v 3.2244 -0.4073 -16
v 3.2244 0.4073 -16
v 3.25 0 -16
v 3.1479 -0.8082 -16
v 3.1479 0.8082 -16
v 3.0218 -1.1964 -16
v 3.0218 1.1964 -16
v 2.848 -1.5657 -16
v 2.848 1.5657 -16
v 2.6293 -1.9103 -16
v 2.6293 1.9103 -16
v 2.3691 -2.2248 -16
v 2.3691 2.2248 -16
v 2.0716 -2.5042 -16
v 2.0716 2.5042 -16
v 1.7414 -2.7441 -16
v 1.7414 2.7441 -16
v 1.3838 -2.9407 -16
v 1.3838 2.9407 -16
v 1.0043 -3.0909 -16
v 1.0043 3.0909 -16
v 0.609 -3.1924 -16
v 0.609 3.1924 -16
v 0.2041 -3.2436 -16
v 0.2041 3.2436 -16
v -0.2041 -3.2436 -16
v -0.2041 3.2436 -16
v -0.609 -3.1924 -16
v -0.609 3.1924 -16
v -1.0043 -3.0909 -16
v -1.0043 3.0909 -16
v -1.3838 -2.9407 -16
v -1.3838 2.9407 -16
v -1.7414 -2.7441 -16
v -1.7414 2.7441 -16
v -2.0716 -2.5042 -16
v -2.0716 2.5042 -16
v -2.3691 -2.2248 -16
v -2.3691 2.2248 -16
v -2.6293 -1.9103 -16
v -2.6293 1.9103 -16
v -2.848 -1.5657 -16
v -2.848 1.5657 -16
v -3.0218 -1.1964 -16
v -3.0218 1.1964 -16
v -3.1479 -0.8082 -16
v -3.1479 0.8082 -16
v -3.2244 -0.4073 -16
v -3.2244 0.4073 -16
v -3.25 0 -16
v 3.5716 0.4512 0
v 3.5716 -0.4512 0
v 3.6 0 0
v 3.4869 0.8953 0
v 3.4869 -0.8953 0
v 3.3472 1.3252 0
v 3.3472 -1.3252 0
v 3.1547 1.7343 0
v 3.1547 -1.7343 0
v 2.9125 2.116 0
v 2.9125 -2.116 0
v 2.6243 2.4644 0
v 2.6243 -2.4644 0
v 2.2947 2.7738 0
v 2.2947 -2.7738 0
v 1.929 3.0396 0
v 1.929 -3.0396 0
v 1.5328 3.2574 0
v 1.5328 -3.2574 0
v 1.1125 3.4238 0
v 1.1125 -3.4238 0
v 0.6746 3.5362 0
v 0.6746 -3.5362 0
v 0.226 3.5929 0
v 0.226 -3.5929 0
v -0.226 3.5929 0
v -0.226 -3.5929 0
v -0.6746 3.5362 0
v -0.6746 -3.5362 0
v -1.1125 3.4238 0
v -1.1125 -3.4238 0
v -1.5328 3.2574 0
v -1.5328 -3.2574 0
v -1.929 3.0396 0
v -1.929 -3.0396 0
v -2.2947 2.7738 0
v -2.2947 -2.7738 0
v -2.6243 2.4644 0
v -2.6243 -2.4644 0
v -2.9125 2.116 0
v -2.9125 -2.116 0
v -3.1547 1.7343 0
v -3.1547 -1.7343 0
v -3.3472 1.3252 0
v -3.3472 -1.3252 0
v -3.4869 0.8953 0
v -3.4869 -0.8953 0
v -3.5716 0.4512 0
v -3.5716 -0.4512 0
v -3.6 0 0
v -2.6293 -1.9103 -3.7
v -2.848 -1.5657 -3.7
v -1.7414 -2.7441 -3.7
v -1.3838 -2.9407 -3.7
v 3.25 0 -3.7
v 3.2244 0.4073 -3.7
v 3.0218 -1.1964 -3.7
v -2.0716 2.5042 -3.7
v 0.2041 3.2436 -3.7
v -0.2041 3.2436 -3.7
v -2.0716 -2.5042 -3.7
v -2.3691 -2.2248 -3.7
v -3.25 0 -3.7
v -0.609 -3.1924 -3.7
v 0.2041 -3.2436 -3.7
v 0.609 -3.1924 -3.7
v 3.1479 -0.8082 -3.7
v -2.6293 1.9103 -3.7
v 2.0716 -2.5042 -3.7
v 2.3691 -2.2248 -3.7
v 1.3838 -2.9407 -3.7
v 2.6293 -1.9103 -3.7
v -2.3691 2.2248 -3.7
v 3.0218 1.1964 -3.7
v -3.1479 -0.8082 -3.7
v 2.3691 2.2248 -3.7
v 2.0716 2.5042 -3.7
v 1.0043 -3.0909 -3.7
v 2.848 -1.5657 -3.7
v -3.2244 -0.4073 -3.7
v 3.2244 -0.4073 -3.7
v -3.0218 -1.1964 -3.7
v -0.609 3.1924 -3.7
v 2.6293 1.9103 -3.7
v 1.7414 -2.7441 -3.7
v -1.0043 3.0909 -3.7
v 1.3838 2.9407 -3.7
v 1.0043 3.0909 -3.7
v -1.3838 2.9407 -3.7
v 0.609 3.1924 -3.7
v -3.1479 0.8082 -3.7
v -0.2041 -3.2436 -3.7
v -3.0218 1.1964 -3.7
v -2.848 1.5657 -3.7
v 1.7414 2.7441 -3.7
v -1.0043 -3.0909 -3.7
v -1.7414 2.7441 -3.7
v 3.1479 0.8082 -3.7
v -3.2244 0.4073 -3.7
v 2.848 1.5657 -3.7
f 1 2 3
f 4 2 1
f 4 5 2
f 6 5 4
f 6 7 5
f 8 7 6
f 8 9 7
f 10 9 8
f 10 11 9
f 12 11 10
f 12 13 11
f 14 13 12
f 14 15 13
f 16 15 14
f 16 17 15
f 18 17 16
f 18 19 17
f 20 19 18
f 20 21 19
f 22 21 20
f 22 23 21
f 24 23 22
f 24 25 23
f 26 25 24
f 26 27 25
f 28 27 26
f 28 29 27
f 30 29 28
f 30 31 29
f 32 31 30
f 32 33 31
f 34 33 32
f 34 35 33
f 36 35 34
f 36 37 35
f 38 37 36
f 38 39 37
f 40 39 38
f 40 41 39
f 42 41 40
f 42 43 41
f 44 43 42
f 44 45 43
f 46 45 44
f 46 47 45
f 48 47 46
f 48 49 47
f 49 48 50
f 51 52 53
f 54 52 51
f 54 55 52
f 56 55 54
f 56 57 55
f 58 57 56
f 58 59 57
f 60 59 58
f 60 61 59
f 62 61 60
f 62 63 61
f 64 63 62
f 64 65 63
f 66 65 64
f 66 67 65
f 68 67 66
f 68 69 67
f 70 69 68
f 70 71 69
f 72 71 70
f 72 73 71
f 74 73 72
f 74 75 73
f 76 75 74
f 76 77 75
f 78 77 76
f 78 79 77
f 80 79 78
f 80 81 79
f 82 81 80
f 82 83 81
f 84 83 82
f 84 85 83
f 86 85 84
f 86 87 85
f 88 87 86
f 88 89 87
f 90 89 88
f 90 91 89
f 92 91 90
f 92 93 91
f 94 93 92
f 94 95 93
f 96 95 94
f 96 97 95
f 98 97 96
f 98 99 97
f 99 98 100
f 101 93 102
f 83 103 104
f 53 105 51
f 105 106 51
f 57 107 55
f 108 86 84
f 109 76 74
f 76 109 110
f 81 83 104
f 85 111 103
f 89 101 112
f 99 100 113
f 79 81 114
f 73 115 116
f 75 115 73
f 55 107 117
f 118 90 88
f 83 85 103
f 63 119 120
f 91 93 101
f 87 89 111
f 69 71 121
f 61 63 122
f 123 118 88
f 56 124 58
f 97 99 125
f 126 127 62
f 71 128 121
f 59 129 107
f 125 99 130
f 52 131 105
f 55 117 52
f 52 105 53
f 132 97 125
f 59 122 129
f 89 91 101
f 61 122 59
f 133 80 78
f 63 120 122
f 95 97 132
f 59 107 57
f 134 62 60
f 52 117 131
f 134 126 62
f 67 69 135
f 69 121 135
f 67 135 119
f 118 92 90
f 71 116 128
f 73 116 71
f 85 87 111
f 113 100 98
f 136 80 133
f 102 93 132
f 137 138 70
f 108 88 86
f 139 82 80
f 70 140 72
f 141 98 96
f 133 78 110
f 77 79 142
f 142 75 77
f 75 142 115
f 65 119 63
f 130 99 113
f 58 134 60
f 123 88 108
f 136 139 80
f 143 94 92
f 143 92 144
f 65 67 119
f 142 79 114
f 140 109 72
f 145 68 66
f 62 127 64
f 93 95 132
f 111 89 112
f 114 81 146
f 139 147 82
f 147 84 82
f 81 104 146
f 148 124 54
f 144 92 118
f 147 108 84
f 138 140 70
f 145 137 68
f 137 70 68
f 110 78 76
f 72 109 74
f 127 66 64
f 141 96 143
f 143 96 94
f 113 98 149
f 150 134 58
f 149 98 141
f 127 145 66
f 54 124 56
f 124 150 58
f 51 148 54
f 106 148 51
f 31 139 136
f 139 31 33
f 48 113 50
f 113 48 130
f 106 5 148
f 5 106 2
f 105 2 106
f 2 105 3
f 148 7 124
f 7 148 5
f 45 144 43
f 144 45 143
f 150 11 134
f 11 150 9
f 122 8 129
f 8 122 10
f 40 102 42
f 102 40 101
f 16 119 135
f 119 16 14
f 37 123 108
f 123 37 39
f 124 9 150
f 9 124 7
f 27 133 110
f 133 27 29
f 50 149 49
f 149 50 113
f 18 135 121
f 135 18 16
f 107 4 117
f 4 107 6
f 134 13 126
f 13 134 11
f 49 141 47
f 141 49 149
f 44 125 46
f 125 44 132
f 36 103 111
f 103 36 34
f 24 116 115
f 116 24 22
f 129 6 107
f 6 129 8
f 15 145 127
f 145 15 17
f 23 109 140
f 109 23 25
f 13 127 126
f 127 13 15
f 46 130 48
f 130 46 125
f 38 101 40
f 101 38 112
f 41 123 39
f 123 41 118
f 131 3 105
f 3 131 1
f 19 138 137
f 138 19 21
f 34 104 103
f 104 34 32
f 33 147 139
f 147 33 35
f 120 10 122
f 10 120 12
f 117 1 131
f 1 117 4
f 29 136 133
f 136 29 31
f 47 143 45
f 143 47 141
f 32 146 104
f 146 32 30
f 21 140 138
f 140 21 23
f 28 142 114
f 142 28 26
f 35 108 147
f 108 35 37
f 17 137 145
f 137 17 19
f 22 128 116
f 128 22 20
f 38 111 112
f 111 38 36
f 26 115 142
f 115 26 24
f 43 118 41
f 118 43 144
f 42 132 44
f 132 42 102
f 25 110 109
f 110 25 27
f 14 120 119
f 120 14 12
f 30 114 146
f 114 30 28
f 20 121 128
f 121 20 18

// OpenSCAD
$fn = 50;


difference() {
	union() {
		translate(v = [0, 0, 0]) {
			rotate(a = [0, 0, 0]) {
				difference() {
					union() {
						translate(v = [0, 0, -16.0000000000]) {
							cylinder(h = 16, r = 3.0000000000);
						}
						translate(v = [0, 0, -3.7000000000]) {
							cylinder(h = 3.7000000000, r1 = 3.2500000000, r2 = 3.6000000000);
						}
						translate(v = [0, 0, -16.0000000000]) {
							cylinder(h = 16, r = 3.2500000000);
						}
						translate(v = [0, 0, -16.0000000000]) {
							cylinder(h = 16, r = 3.0000000000);
						}
					}
					union();
				}
			}
		}
	}
	union();
}
